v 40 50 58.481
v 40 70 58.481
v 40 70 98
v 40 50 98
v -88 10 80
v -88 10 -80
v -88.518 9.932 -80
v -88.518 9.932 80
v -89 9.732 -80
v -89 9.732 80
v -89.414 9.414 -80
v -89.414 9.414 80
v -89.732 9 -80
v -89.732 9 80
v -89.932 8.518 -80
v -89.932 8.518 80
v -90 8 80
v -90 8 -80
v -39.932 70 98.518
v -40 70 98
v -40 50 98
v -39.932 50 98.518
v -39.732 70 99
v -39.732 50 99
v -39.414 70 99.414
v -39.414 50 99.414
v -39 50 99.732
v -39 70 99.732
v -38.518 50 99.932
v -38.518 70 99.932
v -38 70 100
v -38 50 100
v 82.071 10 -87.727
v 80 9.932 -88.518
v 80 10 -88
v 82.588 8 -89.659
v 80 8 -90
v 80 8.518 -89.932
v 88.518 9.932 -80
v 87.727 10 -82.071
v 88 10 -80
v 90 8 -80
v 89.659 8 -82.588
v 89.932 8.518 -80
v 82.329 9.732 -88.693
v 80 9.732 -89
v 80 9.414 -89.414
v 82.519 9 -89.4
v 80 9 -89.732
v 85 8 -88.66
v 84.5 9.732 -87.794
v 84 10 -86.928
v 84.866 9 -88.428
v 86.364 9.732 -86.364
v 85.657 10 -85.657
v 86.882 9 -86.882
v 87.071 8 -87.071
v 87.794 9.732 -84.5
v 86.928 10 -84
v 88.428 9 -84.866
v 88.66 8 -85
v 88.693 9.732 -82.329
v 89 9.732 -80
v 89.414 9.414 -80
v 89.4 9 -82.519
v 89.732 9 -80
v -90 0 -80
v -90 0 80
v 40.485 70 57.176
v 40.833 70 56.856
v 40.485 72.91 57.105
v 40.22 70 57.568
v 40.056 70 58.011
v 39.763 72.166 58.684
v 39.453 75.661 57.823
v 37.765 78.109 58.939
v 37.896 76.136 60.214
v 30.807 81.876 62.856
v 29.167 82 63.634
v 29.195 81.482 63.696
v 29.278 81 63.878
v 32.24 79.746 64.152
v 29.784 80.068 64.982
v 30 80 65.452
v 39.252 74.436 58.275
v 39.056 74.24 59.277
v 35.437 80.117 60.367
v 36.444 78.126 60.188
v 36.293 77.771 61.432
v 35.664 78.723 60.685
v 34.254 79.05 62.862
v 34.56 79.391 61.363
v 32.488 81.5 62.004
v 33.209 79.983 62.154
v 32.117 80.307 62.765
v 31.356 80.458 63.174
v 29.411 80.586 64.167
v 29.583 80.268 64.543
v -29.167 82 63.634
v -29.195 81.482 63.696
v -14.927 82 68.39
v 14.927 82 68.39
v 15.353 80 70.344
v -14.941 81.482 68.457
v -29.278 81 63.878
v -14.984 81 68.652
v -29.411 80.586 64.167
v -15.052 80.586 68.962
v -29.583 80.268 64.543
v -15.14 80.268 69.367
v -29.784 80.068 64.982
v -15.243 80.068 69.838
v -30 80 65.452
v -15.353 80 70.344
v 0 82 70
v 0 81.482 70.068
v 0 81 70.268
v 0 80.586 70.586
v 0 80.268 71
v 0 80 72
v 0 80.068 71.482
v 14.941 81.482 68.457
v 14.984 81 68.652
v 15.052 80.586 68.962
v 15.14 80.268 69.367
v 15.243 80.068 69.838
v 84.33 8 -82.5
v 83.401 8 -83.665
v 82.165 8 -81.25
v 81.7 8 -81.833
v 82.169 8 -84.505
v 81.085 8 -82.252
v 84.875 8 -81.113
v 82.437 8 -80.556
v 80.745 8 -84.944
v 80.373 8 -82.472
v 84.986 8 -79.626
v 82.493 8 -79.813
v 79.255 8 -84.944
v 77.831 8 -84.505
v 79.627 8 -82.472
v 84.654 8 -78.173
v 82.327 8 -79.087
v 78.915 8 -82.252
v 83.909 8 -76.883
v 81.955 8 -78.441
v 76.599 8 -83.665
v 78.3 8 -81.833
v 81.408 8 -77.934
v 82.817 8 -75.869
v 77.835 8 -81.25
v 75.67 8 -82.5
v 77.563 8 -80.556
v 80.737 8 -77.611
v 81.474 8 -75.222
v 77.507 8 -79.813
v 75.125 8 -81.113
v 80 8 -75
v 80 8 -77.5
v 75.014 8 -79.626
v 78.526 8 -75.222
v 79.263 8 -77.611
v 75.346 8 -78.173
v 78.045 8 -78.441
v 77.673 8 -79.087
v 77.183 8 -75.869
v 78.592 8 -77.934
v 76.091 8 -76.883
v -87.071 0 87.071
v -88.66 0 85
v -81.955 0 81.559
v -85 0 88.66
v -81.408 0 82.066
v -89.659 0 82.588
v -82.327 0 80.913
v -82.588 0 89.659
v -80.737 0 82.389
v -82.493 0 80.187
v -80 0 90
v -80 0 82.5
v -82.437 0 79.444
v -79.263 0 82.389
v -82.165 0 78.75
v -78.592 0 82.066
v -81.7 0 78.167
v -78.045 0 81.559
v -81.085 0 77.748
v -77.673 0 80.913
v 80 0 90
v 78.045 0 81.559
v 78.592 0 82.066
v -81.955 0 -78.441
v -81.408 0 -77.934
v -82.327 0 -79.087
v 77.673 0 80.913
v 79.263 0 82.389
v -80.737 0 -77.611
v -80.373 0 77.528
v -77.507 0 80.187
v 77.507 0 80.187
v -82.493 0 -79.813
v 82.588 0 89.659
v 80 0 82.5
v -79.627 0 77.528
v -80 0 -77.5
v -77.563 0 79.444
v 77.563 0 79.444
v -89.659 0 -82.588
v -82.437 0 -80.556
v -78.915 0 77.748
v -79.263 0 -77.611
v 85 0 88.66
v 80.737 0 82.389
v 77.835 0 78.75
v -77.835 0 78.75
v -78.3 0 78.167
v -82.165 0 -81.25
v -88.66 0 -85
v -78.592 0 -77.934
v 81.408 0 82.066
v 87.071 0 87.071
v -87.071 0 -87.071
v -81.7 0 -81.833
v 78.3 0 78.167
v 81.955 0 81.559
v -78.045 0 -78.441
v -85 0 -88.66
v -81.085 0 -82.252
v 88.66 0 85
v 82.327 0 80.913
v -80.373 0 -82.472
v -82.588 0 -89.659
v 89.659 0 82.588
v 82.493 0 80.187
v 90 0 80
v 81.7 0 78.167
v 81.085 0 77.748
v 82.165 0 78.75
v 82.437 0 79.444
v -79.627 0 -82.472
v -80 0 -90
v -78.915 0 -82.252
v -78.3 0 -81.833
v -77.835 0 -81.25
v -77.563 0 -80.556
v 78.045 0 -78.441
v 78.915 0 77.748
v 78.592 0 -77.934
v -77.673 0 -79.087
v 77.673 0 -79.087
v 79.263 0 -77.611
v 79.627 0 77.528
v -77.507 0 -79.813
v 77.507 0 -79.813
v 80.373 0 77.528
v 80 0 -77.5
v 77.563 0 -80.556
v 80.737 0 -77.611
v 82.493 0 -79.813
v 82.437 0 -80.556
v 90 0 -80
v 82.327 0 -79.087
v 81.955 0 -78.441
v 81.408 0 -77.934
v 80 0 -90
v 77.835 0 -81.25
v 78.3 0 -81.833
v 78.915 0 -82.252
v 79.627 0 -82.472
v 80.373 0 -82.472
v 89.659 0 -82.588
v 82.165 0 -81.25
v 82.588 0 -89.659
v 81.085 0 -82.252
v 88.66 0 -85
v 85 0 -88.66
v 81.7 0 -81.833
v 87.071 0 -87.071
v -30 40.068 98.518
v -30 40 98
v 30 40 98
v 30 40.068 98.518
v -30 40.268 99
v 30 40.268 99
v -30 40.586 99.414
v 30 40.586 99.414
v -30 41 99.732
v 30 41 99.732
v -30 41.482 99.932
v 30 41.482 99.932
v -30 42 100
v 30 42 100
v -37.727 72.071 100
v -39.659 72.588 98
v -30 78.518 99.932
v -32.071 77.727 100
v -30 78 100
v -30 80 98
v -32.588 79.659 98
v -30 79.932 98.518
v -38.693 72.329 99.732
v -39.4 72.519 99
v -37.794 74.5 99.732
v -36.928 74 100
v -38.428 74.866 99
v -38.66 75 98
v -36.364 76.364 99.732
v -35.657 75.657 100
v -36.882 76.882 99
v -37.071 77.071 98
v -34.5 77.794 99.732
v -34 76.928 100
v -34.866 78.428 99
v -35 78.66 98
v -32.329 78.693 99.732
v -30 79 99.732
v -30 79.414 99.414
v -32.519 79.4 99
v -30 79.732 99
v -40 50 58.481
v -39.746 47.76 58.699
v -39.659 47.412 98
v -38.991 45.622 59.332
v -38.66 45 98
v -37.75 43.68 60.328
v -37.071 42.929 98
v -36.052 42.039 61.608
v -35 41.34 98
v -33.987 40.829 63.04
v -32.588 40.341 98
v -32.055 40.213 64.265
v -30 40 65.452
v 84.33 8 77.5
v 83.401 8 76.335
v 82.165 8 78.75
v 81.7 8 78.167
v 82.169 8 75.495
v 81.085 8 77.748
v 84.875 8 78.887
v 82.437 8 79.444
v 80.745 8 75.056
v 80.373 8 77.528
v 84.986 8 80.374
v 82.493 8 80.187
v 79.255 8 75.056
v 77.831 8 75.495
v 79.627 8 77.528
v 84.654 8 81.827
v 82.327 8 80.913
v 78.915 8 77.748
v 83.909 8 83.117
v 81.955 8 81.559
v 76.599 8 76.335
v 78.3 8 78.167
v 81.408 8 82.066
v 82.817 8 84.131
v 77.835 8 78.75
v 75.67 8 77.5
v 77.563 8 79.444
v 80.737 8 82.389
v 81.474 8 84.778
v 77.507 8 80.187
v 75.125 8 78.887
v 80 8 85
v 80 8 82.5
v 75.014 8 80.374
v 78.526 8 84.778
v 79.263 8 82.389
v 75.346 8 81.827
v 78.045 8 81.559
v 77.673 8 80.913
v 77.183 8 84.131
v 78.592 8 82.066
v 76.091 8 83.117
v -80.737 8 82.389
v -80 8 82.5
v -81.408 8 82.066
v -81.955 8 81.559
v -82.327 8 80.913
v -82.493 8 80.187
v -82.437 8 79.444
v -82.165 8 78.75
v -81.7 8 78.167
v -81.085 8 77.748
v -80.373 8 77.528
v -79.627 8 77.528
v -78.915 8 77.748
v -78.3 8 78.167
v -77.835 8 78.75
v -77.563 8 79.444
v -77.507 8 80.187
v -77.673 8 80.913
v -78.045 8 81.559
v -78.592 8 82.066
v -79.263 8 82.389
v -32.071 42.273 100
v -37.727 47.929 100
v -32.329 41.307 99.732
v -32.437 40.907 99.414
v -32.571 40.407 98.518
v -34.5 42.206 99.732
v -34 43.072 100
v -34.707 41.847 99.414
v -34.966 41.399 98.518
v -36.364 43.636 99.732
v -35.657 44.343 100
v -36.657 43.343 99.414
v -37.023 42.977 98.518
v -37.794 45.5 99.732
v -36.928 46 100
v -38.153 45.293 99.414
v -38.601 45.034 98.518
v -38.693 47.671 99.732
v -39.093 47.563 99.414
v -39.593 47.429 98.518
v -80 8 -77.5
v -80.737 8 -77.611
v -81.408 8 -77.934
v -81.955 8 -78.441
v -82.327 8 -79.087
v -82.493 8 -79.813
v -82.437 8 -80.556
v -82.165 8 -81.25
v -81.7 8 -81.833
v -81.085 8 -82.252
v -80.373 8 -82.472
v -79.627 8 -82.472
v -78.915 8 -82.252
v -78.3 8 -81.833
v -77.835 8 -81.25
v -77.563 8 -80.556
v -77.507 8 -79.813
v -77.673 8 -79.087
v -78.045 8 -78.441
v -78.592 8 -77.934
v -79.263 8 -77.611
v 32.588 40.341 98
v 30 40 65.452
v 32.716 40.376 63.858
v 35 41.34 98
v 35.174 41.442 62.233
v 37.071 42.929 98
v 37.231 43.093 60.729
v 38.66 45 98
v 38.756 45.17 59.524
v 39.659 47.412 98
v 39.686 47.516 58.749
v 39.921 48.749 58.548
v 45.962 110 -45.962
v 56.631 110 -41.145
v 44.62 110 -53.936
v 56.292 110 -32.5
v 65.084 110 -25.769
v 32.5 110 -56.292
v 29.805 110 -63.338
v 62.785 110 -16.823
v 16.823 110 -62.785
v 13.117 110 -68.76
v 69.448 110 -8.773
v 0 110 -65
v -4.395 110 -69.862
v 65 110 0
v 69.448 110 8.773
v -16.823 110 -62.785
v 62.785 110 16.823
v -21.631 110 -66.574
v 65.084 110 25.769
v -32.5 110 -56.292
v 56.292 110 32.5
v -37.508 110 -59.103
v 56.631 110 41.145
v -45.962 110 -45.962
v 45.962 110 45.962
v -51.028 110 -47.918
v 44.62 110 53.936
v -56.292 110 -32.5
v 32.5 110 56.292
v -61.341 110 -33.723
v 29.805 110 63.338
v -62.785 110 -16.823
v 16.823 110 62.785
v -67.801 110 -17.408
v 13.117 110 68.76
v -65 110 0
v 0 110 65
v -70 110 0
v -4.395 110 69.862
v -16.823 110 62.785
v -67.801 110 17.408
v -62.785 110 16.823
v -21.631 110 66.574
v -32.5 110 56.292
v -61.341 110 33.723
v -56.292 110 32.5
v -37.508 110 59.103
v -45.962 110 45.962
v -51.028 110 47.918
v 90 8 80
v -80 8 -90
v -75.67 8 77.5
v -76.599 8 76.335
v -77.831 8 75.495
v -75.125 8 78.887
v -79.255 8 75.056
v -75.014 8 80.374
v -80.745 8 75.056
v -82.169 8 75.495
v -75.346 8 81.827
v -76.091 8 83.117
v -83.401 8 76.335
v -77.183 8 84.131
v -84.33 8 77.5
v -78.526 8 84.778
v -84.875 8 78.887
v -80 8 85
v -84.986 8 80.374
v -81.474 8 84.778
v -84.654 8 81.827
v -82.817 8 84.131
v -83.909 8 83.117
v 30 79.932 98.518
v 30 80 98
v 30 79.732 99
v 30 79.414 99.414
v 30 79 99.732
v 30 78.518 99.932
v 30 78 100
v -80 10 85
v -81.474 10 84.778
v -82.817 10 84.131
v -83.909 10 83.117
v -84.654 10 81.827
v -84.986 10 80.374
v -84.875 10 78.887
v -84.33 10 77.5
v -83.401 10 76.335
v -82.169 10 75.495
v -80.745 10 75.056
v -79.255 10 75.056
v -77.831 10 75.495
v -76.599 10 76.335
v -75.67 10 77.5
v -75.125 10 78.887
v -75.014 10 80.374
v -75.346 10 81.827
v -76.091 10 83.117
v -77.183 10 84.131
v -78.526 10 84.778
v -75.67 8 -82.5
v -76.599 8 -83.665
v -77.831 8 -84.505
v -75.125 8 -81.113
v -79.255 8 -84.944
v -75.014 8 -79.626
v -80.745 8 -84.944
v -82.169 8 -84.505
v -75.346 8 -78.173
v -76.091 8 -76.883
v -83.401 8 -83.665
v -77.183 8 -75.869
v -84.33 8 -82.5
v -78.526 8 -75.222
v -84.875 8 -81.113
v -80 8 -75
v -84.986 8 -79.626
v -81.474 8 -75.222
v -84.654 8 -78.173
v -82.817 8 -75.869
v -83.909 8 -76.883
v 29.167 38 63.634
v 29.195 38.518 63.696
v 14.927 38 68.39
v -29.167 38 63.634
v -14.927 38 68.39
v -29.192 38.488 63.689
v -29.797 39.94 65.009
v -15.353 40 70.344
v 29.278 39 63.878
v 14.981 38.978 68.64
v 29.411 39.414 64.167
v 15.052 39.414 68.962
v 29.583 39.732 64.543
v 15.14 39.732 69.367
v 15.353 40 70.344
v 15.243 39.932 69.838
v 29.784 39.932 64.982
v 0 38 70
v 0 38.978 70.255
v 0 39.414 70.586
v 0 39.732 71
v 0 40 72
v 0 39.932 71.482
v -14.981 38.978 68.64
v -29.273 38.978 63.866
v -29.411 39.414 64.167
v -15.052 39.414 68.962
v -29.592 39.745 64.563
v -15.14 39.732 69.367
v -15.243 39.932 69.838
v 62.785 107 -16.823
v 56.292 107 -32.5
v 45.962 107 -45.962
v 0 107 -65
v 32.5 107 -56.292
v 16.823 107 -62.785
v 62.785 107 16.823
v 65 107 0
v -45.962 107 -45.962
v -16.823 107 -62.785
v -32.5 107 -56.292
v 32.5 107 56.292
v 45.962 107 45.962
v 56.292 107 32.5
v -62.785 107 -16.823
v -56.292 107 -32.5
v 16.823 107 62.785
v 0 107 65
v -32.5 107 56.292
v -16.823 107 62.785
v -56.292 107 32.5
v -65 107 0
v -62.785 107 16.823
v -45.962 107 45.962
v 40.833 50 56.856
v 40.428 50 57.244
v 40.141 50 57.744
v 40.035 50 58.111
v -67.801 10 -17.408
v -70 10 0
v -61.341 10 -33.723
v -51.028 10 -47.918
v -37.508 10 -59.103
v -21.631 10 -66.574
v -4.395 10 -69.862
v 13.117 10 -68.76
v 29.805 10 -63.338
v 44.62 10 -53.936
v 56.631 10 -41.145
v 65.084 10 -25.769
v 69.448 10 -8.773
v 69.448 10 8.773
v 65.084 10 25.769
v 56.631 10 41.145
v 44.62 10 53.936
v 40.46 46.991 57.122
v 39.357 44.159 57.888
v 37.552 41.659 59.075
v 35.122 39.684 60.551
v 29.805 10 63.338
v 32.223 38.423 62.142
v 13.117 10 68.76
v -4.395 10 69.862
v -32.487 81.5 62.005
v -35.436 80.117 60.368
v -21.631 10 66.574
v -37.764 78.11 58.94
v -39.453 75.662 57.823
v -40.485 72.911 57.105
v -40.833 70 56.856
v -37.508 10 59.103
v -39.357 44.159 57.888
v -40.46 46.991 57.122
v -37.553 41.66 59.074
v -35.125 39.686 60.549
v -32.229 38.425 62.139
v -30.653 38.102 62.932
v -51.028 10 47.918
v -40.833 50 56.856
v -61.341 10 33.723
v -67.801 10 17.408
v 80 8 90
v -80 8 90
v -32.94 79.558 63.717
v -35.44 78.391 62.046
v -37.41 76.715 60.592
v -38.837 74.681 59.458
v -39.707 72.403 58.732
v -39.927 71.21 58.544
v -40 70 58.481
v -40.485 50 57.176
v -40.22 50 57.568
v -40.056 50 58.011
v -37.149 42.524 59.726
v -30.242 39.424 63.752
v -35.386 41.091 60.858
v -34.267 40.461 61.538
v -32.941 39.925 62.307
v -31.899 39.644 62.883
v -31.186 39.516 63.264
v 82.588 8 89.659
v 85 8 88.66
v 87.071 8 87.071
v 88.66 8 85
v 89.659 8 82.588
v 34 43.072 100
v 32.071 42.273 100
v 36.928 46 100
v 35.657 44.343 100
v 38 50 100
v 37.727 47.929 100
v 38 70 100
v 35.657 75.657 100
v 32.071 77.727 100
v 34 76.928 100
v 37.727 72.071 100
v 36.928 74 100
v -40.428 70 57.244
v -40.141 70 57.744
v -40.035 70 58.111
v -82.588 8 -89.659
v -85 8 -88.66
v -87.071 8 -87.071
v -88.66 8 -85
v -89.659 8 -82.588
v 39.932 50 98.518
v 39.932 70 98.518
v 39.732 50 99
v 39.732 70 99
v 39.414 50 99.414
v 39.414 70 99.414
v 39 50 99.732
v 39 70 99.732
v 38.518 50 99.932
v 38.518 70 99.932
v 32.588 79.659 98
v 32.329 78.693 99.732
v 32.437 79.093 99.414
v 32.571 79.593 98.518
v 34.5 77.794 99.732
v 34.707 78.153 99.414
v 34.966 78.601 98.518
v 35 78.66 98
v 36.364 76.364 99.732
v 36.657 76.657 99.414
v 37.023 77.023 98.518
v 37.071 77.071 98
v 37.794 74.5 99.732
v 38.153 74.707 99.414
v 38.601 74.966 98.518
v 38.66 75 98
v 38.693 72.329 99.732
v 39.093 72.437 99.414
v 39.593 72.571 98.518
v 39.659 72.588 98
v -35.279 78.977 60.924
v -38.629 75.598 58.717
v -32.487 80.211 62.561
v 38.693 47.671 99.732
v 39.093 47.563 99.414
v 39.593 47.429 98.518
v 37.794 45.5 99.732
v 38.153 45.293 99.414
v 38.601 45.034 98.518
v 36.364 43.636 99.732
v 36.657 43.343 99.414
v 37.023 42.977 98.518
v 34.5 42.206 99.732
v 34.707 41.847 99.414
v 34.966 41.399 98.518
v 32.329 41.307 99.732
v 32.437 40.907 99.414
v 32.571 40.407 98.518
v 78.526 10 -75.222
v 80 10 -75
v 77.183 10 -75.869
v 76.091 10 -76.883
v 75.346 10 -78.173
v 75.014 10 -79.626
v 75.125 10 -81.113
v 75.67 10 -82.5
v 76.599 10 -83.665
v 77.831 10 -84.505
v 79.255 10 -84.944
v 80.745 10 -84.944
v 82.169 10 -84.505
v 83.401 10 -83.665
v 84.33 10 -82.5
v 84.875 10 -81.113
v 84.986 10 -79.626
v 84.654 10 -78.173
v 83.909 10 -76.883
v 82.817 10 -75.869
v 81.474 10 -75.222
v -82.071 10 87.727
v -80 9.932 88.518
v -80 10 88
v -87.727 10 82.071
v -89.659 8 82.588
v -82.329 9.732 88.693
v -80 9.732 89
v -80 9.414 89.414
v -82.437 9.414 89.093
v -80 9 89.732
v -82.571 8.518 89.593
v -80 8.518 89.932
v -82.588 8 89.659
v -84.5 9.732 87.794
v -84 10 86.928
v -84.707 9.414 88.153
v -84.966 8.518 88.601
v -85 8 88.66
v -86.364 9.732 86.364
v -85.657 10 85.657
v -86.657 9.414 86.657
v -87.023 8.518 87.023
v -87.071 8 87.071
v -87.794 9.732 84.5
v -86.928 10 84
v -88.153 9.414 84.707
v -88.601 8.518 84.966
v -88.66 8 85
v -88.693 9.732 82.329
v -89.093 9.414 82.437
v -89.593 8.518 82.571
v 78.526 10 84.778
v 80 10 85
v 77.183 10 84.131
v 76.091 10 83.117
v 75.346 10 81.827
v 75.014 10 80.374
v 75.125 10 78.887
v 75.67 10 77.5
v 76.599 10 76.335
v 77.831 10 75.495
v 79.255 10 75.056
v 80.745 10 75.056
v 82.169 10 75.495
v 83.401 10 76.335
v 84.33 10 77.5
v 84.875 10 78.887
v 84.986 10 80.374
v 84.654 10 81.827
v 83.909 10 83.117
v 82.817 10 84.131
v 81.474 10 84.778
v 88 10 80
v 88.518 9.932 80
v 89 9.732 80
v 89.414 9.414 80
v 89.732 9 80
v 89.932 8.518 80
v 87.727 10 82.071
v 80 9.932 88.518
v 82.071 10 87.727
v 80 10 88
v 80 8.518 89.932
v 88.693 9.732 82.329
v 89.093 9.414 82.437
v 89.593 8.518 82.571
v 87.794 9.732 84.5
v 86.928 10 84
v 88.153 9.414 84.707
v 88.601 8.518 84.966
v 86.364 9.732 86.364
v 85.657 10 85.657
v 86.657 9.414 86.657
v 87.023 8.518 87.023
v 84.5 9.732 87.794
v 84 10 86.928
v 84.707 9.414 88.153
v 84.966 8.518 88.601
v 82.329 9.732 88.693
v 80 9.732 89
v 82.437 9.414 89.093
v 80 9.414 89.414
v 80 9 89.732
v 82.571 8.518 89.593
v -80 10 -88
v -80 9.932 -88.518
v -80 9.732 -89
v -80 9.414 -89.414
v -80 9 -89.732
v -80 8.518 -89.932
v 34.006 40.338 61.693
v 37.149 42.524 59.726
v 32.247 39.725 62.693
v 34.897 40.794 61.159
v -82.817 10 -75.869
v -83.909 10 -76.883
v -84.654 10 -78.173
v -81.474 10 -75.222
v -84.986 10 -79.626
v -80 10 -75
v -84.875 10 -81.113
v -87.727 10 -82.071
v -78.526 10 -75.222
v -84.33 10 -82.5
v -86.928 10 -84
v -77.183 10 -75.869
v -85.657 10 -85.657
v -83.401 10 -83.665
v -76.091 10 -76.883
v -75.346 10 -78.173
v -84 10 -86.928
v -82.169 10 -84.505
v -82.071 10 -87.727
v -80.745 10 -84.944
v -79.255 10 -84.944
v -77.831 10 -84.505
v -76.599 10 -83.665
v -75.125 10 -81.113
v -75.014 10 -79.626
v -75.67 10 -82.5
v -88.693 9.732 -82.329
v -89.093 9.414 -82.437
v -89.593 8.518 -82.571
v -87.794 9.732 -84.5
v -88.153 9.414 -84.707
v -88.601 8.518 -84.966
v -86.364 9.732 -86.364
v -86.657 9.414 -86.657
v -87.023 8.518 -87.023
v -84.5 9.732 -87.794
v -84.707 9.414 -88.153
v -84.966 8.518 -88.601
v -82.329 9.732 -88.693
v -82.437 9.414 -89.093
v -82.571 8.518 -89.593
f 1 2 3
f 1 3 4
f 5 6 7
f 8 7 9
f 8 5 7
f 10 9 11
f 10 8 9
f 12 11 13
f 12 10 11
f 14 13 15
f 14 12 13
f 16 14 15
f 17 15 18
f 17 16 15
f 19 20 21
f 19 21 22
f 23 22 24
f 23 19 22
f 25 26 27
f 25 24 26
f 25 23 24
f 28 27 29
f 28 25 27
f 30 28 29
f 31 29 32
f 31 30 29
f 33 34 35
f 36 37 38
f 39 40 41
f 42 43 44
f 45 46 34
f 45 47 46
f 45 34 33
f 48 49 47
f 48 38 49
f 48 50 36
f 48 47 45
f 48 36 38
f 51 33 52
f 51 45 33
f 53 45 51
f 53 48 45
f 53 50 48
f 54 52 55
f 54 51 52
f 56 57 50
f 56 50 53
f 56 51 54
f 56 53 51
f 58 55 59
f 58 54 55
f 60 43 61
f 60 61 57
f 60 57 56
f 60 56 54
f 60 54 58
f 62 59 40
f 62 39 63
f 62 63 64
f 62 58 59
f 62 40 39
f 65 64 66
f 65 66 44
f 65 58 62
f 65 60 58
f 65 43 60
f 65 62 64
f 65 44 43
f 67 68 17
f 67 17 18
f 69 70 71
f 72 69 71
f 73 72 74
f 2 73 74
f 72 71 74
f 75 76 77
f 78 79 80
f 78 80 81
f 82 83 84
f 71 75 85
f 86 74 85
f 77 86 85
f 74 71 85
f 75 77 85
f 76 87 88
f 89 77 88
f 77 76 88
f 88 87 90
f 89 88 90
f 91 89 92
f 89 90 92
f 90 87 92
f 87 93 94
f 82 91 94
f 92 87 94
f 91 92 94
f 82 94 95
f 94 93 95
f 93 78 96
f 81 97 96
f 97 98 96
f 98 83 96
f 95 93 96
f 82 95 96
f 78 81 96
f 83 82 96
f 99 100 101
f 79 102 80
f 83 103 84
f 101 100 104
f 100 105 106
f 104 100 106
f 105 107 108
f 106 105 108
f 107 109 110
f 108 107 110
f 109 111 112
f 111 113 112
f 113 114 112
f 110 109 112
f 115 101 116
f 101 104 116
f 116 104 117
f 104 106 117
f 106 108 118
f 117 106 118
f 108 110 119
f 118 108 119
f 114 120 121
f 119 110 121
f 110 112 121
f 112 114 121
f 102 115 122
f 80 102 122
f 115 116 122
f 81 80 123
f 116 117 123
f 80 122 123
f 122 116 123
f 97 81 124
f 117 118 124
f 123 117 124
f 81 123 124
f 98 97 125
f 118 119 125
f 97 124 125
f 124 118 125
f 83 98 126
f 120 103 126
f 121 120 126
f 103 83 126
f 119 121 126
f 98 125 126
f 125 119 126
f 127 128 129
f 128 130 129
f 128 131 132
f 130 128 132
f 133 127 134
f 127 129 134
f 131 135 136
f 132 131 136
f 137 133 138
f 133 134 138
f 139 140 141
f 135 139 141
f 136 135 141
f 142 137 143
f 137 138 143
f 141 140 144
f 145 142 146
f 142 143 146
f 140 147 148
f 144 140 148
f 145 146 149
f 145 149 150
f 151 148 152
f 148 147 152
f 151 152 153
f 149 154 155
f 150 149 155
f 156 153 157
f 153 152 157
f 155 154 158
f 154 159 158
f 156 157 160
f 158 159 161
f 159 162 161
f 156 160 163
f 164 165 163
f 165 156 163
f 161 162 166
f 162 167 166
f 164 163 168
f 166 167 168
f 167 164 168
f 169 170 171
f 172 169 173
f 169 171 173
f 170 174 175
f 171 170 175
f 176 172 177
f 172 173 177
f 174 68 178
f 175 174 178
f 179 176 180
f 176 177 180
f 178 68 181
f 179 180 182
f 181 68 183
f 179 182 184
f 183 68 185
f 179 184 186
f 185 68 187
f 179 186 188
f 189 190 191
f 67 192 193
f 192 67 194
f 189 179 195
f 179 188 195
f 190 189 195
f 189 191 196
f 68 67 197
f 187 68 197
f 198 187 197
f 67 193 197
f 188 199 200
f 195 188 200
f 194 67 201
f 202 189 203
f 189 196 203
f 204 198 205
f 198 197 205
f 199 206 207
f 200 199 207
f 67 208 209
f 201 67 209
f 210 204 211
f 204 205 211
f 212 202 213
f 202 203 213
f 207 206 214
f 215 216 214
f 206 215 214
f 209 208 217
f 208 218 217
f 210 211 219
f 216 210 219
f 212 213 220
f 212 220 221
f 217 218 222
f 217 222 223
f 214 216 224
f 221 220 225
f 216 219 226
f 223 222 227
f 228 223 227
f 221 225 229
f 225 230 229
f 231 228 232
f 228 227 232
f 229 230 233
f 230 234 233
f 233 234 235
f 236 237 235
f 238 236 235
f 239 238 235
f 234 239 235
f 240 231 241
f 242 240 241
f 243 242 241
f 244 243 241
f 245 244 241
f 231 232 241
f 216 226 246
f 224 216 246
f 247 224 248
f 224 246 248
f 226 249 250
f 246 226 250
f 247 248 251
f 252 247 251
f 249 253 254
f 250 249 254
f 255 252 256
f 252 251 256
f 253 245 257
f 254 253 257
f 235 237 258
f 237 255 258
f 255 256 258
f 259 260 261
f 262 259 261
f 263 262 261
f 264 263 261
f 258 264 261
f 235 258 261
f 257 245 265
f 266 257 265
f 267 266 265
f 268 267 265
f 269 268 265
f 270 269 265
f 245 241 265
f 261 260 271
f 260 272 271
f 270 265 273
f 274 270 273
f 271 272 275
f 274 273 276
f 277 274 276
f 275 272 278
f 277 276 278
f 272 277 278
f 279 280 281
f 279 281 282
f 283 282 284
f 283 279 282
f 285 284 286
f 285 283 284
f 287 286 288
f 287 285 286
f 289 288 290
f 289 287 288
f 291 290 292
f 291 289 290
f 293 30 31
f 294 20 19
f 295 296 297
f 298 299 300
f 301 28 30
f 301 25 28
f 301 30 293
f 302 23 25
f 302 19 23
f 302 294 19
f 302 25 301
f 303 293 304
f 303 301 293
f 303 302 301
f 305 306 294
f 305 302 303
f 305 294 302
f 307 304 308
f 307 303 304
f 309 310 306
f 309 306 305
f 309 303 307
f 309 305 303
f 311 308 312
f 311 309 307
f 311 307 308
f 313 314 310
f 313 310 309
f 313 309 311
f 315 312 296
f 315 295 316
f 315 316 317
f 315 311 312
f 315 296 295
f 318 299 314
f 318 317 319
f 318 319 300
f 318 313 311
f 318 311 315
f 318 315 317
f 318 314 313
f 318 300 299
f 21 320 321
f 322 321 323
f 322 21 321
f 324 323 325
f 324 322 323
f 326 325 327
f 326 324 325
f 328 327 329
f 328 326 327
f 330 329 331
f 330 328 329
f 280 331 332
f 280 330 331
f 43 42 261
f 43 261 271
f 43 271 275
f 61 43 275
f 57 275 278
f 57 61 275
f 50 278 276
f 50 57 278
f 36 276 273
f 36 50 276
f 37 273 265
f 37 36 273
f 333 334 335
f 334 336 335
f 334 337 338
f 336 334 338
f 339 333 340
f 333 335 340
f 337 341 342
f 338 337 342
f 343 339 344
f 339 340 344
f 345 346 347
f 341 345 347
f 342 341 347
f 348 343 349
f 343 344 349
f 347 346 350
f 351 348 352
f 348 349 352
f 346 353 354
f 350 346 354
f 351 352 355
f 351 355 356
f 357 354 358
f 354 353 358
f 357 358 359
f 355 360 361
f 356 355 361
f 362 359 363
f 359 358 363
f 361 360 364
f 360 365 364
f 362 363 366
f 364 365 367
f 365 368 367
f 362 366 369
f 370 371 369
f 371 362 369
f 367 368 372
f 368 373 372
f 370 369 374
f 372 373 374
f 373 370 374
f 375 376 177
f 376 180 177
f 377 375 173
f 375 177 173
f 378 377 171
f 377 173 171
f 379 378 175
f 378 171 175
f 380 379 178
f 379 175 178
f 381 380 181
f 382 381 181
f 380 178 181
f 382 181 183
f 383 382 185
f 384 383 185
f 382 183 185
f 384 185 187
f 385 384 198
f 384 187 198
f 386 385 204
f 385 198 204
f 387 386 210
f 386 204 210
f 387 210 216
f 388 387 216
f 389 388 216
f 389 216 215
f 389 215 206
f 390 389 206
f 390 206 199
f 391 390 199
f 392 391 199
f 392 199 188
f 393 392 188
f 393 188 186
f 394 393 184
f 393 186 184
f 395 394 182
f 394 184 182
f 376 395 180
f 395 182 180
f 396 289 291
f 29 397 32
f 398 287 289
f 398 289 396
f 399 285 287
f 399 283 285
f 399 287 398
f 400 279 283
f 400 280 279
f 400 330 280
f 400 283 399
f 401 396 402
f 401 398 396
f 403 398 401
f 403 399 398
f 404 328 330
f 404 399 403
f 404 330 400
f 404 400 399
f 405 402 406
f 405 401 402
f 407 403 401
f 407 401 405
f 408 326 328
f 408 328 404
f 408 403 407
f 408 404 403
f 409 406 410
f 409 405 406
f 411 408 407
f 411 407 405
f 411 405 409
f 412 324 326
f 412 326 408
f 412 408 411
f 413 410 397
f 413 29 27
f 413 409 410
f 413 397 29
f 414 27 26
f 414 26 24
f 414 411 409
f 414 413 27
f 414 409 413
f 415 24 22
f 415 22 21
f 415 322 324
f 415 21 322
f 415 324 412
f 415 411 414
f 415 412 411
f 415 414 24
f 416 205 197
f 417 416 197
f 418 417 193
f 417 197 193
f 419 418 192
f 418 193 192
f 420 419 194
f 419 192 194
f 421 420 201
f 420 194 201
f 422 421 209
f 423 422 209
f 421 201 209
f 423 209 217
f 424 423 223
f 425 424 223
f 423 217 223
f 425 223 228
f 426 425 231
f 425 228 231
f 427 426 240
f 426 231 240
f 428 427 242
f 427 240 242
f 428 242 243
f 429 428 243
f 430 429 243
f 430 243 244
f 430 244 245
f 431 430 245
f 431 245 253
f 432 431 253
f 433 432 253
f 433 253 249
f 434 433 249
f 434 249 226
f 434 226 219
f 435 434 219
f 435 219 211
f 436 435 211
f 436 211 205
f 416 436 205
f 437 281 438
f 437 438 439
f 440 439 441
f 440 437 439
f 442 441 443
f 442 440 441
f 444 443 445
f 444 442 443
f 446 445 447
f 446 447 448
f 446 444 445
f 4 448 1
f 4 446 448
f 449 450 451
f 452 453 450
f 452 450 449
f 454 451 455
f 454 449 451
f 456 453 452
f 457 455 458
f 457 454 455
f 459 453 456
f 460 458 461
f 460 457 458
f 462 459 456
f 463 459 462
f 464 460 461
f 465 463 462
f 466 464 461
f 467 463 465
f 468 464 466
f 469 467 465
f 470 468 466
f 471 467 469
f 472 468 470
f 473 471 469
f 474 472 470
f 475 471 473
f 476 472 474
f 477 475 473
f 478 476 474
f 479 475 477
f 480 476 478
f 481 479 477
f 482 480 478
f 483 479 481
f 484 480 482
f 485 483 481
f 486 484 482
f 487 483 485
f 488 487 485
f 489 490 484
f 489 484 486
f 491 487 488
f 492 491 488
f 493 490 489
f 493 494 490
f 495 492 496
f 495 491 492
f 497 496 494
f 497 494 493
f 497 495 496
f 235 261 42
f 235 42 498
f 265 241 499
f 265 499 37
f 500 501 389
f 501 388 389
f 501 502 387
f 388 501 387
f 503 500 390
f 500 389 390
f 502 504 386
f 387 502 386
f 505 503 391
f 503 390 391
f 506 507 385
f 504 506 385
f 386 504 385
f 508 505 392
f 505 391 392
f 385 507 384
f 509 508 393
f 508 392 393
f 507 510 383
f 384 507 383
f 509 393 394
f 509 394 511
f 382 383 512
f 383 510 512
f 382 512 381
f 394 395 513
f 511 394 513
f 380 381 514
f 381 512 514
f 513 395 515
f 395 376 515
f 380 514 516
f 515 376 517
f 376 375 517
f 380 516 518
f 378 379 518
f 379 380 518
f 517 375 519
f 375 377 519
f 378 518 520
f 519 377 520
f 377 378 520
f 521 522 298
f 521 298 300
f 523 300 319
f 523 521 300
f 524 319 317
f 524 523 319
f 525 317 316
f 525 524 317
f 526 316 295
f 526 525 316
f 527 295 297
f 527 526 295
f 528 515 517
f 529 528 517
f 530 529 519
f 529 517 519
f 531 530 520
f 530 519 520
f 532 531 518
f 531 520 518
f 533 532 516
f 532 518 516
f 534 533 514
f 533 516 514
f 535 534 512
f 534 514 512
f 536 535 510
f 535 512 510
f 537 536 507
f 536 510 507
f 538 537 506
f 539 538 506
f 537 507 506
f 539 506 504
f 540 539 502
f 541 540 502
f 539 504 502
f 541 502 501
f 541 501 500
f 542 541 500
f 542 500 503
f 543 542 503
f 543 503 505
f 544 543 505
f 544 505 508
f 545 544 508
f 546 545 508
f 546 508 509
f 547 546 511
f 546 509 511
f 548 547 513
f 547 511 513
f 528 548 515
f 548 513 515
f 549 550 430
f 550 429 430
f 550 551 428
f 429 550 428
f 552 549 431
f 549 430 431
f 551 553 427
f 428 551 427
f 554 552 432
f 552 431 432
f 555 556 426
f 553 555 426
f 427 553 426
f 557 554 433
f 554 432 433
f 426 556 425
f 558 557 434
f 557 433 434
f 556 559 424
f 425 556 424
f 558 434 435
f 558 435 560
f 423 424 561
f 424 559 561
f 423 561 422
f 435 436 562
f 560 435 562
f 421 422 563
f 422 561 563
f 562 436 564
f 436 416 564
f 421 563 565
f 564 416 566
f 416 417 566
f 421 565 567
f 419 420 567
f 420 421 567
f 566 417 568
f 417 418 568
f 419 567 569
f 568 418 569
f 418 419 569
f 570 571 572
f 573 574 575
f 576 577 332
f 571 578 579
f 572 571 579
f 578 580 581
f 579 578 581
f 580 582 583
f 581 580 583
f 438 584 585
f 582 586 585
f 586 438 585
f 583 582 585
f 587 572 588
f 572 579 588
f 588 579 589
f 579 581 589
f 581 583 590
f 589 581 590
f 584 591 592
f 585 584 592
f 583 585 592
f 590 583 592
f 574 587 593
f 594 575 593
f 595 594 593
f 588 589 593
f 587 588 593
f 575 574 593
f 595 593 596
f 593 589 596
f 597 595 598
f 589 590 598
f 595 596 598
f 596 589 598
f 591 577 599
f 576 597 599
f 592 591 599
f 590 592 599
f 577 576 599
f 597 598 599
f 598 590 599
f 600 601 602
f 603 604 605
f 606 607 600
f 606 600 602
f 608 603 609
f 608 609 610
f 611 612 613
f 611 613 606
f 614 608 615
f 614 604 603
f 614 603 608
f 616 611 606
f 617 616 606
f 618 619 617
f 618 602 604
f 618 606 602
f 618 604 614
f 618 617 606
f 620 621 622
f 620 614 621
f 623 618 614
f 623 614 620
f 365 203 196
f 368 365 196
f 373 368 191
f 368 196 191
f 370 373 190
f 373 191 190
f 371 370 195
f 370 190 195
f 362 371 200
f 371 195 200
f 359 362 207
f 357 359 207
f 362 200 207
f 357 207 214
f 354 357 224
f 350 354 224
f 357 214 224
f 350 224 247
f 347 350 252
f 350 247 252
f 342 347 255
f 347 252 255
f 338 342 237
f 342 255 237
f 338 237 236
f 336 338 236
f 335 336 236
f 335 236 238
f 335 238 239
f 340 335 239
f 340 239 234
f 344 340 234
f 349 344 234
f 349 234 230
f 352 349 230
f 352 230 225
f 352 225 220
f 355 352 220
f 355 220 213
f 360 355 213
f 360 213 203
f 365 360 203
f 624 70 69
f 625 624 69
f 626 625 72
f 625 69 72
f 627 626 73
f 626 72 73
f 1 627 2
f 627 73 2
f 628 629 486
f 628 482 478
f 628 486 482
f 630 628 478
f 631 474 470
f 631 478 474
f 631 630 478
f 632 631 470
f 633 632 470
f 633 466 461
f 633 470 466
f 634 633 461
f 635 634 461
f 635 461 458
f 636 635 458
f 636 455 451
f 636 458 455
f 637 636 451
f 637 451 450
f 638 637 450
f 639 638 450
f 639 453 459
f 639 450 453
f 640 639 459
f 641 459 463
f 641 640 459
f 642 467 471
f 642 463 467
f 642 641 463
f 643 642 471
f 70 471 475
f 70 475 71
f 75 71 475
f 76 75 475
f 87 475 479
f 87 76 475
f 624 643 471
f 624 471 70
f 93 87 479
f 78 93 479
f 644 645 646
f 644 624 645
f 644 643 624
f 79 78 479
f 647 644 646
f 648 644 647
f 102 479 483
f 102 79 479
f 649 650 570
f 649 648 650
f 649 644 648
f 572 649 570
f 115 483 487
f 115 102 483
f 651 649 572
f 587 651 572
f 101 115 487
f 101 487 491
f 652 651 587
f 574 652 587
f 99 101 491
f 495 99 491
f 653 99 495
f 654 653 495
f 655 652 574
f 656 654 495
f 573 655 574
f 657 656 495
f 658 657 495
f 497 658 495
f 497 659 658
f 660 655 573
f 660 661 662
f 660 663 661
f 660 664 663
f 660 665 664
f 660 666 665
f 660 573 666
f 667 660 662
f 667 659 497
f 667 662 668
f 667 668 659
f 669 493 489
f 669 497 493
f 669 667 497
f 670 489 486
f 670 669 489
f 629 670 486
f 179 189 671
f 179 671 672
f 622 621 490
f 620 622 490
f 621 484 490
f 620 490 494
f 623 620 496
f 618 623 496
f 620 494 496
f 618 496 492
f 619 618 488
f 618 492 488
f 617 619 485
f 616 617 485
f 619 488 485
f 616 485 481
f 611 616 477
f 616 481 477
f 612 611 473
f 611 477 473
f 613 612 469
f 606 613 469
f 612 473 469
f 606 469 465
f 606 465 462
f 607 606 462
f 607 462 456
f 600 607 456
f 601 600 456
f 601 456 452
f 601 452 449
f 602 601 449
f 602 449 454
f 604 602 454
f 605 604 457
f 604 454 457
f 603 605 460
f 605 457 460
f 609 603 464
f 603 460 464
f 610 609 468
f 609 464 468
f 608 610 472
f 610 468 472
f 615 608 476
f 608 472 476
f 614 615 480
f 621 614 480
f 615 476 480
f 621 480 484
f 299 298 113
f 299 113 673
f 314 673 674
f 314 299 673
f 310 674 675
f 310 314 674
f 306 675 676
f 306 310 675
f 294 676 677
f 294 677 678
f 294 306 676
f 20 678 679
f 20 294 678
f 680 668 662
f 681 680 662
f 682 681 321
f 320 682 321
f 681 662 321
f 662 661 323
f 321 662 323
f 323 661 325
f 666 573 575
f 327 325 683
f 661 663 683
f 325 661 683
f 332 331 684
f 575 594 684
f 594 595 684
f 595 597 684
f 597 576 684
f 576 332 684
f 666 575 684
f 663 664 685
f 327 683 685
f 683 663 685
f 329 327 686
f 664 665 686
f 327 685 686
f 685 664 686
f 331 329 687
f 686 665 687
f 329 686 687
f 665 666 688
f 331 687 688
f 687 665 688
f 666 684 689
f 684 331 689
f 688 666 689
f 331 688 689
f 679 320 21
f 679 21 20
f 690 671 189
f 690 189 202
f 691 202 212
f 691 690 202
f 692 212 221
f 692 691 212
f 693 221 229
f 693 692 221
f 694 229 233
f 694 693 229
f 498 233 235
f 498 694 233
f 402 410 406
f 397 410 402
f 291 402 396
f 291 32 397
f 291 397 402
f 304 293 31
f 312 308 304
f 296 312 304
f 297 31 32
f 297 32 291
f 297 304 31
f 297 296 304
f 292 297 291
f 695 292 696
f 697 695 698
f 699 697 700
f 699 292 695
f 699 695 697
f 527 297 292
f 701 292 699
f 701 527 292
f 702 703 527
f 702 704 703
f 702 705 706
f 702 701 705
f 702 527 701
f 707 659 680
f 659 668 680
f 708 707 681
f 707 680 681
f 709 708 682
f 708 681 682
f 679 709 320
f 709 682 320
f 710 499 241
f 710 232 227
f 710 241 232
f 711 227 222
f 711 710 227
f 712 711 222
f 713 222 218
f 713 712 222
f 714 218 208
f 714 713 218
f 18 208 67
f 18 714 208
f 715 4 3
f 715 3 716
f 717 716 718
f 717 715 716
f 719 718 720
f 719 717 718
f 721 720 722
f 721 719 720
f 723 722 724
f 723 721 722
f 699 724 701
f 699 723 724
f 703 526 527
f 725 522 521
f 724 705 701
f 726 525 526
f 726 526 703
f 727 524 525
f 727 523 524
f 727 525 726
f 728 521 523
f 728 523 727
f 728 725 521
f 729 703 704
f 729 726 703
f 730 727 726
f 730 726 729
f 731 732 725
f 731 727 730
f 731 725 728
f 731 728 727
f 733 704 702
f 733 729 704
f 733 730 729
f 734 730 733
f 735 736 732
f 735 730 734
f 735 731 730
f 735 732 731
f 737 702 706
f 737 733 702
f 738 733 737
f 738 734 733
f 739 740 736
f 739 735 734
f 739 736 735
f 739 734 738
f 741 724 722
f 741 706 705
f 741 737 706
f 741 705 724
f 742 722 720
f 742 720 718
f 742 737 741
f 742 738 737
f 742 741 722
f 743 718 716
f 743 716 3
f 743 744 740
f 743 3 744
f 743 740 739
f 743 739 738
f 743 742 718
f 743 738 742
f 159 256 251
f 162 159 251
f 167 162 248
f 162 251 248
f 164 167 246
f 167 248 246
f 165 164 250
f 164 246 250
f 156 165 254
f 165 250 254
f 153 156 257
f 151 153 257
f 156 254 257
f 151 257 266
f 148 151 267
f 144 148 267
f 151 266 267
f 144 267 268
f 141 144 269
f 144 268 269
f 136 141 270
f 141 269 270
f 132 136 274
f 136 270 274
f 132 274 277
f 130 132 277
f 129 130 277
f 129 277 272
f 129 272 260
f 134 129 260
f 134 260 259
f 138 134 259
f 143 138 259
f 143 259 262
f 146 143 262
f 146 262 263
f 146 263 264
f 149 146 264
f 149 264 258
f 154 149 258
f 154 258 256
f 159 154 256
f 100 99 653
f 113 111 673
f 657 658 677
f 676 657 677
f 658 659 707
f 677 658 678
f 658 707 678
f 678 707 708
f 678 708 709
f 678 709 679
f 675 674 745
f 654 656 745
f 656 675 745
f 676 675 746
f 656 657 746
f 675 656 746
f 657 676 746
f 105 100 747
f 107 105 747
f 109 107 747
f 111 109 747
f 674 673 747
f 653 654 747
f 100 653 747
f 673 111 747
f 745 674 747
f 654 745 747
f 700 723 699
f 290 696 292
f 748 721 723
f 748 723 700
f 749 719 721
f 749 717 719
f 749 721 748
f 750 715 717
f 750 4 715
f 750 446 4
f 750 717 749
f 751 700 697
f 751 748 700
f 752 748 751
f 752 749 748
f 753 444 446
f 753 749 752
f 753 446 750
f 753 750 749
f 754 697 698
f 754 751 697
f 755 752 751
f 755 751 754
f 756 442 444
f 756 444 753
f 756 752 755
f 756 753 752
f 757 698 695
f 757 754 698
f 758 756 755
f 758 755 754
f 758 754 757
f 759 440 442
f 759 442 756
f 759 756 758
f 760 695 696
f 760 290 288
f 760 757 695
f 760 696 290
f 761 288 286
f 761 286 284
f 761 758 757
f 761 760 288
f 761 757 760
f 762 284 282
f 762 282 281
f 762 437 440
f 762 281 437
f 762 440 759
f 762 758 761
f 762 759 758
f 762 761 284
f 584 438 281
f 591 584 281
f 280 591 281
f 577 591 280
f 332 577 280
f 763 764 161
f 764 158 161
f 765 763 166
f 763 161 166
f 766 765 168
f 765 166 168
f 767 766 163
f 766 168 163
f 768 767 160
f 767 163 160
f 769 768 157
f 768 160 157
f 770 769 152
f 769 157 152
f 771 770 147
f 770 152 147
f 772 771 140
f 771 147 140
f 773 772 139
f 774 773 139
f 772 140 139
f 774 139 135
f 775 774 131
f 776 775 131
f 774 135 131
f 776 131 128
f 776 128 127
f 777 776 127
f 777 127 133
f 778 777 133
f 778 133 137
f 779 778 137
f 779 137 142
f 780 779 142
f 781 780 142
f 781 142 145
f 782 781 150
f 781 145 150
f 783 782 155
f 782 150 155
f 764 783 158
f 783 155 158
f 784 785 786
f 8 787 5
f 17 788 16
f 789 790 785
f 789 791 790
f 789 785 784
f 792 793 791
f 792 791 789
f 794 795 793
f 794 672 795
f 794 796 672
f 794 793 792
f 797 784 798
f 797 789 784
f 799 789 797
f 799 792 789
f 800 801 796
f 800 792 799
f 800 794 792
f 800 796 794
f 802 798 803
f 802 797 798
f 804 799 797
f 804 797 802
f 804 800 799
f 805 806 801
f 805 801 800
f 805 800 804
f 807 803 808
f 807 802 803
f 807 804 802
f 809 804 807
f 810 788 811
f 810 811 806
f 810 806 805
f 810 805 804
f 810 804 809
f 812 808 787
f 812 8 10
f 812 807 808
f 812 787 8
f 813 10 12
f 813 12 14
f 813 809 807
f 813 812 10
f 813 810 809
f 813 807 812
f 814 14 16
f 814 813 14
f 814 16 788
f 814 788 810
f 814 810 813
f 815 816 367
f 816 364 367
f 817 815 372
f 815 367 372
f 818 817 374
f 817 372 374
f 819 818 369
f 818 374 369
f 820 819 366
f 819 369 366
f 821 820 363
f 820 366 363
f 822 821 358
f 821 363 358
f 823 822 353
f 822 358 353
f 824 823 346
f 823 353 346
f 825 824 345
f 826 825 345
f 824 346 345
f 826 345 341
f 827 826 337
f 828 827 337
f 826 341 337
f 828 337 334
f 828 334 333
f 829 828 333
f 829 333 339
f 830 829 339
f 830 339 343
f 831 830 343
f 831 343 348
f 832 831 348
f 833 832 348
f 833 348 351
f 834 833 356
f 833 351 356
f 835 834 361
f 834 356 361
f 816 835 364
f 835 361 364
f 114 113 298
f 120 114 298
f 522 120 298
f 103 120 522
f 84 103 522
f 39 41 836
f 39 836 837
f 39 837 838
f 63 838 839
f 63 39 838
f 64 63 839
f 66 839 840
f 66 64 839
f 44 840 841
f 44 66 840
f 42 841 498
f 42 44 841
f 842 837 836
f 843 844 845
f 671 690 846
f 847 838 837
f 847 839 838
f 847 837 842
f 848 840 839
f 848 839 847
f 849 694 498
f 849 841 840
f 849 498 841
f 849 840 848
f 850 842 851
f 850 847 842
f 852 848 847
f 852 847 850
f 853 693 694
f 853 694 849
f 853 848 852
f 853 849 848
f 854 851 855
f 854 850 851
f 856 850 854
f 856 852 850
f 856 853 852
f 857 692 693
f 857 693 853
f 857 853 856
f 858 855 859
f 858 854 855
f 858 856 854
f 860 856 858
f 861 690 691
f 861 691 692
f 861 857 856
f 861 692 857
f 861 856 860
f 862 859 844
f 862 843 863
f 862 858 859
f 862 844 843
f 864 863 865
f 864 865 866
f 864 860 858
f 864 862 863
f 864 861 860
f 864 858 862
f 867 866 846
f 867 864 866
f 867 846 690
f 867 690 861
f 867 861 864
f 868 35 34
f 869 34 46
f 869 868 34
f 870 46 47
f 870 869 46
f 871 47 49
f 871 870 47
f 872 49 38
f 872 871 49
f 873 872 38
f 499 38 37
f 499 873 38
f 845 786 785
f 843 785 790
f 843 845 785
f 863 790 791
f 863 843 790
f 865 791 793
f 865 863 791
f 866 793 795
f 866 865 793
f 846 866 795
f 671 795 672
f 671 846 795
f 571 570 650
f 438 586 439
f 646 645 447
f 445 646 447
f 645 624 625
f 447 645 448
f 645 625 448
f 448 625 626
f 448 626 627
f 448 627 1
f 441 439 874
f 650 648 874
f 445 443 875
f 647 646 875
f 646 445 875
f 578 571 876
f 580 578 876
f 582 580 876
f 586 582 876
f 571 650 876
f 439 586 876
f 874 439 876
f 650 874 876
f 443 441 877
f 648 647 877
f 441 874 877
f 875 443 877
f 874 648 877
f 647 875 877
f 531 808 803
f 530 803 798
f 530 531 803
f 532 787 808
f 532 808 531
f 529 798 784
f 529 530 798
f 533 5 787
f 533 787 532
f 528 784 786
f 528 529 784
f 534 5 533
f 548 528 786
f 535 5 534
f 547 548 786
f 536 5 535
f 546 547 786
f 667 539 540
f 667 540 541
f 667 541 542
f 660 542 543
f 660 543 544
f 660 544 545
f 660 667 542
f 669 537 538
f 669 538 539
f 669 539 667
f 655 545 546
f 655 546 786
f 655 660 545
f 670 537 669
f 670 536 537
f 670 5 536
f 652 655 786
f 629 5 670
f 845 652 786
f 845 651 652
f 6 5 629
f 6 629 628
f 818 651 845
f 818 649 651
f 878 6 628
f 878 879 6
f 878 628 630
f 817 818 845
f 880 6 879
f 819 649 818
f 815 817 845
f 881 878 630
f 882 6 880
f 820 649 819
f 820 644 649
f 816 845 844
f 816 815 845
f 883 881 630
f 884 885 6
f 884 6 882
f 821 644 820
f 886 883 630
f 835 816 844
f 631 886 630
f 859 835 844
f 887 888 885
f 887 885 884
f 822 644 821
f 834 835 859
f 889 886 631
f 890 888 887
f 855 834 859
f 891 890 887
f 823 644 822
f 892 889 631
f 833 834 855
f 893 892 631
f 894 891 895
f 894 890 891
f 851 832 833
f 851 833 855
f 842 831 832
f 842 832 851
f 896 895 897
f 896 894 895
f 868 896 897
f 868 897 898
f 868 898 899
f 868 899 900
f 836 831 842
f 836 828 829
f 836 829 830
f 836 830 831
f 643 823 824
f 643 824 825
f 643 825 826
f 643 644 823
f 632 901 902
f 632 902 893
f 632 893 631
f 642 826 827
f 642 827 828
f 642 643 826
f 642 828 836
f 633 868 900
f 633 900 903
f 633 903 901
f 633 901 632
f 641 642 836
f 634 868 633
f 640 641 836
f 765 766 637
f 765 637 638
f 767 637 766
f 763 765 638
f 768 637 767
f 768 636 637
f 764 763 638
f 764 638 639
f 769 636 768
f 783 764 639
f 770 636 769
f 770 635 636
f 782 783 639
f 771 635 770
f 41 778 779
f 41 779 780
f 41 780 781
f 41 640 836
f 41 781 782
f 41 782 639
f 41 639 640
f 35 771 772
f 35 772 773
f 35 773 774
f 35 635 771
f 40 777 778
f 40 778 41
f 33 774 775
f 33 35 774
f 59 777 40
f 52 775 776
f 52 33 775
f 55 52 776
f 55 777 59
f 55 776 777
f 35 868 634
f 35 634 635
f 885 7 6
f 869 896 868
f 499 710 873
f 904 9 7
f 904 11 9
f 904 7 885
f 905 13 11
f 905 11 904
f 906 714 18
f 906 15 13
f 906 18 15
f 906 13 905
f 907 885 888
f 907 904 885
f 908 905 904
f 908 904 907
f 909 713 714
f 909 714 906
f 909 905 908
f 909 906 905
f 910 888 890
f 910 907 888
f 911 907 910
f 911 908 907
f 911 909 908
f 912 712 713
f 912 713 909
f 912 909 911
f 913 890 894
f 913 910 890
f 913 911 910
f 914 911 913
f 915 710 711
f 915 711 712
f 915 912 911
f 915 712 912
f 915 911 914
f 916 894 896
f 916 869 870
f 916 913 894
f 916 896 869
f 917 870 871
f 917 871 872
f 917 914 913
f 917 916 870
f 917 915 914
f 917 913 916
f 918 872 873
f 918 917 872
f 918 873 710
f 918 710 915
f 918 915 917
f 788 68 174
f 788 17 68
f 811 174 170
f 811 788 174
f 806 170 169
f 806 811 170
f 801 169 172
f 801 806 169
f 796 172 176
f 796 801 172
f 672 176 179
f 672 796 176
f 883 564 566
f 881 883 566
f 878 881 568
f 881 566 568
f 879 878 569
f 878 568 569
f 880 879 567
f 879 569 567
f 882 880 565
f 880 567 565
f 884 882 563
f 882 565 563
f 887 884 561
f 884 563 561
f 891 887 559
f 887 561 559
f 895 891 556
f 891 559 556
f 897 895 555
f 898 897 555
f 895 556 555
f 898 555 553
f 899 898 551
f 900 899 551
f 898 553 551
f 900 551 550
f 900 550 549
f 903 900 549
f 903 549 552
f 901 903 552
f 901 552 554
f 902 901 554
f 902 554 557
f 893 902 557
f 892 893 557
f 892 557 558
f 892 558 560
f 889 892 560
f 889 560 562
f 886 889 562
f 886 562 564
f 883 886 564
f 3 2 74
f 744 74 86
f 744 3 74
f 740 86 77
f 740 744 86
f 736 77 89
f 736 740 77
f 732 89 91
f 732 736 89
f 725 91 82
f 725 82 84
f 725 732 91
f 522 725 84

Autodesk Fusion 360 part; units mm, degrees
sketch "Sketch1" plane through (0, 0, 0) normal (0, 1, 0) x (1, 0, 0)
  line L0 (90, -90) -> (-90, -90)
  line L1 (-90, -90) -> (-90, 90)
  line L2 (-90, 90) -> (90, 90)
  line L3 (90, 90) -> (90, -90)
  line L4 (90, -90) -> (-90, 90) construction
  line L5 (-90, -90) -> (90, 90) construction
  dimension "d1" = 180
  dimension "d2" = 180
extrude "Extrude1" add sketch "Sketch1" along normal blind 10
sketch "Sketch2" plane through (0, 10, 0) normal (0, 1, 0) x (-1, 0, 0)
  line L0 (-90, -90) -> (90, -90)
  line L1 (90, -90) -> (90, 90)
  line L2 (90, 90) -> (-90, 90)
  line L3 (-90, 90) -> (-90, -90)
  circle A0 centre (0, 0) radius 70
  dimension "d5" = 140
extrude "Extrude2" add sketch "Sketch2" along normal blind 100 contours A0
sketch "Sketch3" plane through (0, 0, 0) normal (0, 0, 1) x (1, 0, 0)
  line L0 (40, 40) -> (-40, 40)
  line L1 (-40, 40) -> (-40, 80)
  line L2 (-40, 80) -> (40, 80)
  line L3 (40, 80) -> (40, 40)
  line L4 (40, 40) -> (-40, 80) construction
  line L5 (-40, 40) -> (40, 80) construction
  point P0 (0, 60)
  dimension "d8" = 80
  dimension "d9" = 40
  dimension "d10" = 60
extrude "Extrude3" add sketch "Sketch3" along normal blind 100
sketch "Sketch4" plane through (0, 110, 0) normal (0, 1, 0) x (-1, 0, 0)
  circle A0 centre (0, 0) radius 70
  circle A1 centre (0, 0) radius 65
  dimension "d13" = -5
extrude "Extrude4" cut sketch "Sketch4" against normal blind 3 contours A1
sketch "Sketch5" plane through (0, 10, 0) normal (0, 1, 0) x (-1, 0, 0)
  circle A0 centre (0, 0) radius 70
  line L0 (-90, -90) -> (90, -90)
  line L1 (90, -90) -> (90, 90)
  line L2 (90, 90) -> (-90, 90)
  line L3 (-90, 90) -> (-90, -90)
  point P0 (80, -80)
  point P1 (-80, -80)
  point P2 (-80, 80)
  point P3 (80, 80)
  dimension "d16" = 10
  dimension "d17" = 10
  dimension "d18" = 10
  dimension "d19" = 10
  dimension "d20" = 10
  dimension "d21" = 10
  dimension "d22" = 10
  dimension "d23" = 10
hole "Hole1" at (-80, 10, 80) at (80, 10, 80) at (80, 10, -80) at (-80, 10, -80) direction (0, -1, 0) diameter 5 depth 10 tip angle 118 counterbore diameter 10 counterbore depth 2
fillet "Fillet1" radius 10 8 edges at (-90, 5, 90) (90, 5, 90) (90, 5, -90) (-90, 5, -90) (-40, 80, 78.7228) (-40, 40, 78.7228) (40, 80, 78.7228) (40, 40, 78.7228)
fillet "Fillet2" radius 2 24 edges at (87.0711, 10, -87.0711) (0, 10, -90) (-87.0711, 10, -87.0711) (-90, 10, 0) (-87.0711, 10, 87.0711) (0, 10, 90) (87.0711, 10, 87.0711) (90, 10, 0) (36.9012, 77.2363, 59.4835) (40, 60, 57.4456) (36.9012, 42.7637, 59.4835) (0, 40, 70) (-36.9012, 42.7637, 59.4835) (-40, 60, 57.4456) (-36.9012, 77.2363, 59.4835) (0, 80, 70) (-37.0711, 77.0711, 100) (-40, 60, 100) (-37.0711, 42.9289, 100) (0, 40, 100) (37.0711, 42.9289, 100) (40, 60, 100) (37.0711, 77.0711, 100) (0, 80, 100)
